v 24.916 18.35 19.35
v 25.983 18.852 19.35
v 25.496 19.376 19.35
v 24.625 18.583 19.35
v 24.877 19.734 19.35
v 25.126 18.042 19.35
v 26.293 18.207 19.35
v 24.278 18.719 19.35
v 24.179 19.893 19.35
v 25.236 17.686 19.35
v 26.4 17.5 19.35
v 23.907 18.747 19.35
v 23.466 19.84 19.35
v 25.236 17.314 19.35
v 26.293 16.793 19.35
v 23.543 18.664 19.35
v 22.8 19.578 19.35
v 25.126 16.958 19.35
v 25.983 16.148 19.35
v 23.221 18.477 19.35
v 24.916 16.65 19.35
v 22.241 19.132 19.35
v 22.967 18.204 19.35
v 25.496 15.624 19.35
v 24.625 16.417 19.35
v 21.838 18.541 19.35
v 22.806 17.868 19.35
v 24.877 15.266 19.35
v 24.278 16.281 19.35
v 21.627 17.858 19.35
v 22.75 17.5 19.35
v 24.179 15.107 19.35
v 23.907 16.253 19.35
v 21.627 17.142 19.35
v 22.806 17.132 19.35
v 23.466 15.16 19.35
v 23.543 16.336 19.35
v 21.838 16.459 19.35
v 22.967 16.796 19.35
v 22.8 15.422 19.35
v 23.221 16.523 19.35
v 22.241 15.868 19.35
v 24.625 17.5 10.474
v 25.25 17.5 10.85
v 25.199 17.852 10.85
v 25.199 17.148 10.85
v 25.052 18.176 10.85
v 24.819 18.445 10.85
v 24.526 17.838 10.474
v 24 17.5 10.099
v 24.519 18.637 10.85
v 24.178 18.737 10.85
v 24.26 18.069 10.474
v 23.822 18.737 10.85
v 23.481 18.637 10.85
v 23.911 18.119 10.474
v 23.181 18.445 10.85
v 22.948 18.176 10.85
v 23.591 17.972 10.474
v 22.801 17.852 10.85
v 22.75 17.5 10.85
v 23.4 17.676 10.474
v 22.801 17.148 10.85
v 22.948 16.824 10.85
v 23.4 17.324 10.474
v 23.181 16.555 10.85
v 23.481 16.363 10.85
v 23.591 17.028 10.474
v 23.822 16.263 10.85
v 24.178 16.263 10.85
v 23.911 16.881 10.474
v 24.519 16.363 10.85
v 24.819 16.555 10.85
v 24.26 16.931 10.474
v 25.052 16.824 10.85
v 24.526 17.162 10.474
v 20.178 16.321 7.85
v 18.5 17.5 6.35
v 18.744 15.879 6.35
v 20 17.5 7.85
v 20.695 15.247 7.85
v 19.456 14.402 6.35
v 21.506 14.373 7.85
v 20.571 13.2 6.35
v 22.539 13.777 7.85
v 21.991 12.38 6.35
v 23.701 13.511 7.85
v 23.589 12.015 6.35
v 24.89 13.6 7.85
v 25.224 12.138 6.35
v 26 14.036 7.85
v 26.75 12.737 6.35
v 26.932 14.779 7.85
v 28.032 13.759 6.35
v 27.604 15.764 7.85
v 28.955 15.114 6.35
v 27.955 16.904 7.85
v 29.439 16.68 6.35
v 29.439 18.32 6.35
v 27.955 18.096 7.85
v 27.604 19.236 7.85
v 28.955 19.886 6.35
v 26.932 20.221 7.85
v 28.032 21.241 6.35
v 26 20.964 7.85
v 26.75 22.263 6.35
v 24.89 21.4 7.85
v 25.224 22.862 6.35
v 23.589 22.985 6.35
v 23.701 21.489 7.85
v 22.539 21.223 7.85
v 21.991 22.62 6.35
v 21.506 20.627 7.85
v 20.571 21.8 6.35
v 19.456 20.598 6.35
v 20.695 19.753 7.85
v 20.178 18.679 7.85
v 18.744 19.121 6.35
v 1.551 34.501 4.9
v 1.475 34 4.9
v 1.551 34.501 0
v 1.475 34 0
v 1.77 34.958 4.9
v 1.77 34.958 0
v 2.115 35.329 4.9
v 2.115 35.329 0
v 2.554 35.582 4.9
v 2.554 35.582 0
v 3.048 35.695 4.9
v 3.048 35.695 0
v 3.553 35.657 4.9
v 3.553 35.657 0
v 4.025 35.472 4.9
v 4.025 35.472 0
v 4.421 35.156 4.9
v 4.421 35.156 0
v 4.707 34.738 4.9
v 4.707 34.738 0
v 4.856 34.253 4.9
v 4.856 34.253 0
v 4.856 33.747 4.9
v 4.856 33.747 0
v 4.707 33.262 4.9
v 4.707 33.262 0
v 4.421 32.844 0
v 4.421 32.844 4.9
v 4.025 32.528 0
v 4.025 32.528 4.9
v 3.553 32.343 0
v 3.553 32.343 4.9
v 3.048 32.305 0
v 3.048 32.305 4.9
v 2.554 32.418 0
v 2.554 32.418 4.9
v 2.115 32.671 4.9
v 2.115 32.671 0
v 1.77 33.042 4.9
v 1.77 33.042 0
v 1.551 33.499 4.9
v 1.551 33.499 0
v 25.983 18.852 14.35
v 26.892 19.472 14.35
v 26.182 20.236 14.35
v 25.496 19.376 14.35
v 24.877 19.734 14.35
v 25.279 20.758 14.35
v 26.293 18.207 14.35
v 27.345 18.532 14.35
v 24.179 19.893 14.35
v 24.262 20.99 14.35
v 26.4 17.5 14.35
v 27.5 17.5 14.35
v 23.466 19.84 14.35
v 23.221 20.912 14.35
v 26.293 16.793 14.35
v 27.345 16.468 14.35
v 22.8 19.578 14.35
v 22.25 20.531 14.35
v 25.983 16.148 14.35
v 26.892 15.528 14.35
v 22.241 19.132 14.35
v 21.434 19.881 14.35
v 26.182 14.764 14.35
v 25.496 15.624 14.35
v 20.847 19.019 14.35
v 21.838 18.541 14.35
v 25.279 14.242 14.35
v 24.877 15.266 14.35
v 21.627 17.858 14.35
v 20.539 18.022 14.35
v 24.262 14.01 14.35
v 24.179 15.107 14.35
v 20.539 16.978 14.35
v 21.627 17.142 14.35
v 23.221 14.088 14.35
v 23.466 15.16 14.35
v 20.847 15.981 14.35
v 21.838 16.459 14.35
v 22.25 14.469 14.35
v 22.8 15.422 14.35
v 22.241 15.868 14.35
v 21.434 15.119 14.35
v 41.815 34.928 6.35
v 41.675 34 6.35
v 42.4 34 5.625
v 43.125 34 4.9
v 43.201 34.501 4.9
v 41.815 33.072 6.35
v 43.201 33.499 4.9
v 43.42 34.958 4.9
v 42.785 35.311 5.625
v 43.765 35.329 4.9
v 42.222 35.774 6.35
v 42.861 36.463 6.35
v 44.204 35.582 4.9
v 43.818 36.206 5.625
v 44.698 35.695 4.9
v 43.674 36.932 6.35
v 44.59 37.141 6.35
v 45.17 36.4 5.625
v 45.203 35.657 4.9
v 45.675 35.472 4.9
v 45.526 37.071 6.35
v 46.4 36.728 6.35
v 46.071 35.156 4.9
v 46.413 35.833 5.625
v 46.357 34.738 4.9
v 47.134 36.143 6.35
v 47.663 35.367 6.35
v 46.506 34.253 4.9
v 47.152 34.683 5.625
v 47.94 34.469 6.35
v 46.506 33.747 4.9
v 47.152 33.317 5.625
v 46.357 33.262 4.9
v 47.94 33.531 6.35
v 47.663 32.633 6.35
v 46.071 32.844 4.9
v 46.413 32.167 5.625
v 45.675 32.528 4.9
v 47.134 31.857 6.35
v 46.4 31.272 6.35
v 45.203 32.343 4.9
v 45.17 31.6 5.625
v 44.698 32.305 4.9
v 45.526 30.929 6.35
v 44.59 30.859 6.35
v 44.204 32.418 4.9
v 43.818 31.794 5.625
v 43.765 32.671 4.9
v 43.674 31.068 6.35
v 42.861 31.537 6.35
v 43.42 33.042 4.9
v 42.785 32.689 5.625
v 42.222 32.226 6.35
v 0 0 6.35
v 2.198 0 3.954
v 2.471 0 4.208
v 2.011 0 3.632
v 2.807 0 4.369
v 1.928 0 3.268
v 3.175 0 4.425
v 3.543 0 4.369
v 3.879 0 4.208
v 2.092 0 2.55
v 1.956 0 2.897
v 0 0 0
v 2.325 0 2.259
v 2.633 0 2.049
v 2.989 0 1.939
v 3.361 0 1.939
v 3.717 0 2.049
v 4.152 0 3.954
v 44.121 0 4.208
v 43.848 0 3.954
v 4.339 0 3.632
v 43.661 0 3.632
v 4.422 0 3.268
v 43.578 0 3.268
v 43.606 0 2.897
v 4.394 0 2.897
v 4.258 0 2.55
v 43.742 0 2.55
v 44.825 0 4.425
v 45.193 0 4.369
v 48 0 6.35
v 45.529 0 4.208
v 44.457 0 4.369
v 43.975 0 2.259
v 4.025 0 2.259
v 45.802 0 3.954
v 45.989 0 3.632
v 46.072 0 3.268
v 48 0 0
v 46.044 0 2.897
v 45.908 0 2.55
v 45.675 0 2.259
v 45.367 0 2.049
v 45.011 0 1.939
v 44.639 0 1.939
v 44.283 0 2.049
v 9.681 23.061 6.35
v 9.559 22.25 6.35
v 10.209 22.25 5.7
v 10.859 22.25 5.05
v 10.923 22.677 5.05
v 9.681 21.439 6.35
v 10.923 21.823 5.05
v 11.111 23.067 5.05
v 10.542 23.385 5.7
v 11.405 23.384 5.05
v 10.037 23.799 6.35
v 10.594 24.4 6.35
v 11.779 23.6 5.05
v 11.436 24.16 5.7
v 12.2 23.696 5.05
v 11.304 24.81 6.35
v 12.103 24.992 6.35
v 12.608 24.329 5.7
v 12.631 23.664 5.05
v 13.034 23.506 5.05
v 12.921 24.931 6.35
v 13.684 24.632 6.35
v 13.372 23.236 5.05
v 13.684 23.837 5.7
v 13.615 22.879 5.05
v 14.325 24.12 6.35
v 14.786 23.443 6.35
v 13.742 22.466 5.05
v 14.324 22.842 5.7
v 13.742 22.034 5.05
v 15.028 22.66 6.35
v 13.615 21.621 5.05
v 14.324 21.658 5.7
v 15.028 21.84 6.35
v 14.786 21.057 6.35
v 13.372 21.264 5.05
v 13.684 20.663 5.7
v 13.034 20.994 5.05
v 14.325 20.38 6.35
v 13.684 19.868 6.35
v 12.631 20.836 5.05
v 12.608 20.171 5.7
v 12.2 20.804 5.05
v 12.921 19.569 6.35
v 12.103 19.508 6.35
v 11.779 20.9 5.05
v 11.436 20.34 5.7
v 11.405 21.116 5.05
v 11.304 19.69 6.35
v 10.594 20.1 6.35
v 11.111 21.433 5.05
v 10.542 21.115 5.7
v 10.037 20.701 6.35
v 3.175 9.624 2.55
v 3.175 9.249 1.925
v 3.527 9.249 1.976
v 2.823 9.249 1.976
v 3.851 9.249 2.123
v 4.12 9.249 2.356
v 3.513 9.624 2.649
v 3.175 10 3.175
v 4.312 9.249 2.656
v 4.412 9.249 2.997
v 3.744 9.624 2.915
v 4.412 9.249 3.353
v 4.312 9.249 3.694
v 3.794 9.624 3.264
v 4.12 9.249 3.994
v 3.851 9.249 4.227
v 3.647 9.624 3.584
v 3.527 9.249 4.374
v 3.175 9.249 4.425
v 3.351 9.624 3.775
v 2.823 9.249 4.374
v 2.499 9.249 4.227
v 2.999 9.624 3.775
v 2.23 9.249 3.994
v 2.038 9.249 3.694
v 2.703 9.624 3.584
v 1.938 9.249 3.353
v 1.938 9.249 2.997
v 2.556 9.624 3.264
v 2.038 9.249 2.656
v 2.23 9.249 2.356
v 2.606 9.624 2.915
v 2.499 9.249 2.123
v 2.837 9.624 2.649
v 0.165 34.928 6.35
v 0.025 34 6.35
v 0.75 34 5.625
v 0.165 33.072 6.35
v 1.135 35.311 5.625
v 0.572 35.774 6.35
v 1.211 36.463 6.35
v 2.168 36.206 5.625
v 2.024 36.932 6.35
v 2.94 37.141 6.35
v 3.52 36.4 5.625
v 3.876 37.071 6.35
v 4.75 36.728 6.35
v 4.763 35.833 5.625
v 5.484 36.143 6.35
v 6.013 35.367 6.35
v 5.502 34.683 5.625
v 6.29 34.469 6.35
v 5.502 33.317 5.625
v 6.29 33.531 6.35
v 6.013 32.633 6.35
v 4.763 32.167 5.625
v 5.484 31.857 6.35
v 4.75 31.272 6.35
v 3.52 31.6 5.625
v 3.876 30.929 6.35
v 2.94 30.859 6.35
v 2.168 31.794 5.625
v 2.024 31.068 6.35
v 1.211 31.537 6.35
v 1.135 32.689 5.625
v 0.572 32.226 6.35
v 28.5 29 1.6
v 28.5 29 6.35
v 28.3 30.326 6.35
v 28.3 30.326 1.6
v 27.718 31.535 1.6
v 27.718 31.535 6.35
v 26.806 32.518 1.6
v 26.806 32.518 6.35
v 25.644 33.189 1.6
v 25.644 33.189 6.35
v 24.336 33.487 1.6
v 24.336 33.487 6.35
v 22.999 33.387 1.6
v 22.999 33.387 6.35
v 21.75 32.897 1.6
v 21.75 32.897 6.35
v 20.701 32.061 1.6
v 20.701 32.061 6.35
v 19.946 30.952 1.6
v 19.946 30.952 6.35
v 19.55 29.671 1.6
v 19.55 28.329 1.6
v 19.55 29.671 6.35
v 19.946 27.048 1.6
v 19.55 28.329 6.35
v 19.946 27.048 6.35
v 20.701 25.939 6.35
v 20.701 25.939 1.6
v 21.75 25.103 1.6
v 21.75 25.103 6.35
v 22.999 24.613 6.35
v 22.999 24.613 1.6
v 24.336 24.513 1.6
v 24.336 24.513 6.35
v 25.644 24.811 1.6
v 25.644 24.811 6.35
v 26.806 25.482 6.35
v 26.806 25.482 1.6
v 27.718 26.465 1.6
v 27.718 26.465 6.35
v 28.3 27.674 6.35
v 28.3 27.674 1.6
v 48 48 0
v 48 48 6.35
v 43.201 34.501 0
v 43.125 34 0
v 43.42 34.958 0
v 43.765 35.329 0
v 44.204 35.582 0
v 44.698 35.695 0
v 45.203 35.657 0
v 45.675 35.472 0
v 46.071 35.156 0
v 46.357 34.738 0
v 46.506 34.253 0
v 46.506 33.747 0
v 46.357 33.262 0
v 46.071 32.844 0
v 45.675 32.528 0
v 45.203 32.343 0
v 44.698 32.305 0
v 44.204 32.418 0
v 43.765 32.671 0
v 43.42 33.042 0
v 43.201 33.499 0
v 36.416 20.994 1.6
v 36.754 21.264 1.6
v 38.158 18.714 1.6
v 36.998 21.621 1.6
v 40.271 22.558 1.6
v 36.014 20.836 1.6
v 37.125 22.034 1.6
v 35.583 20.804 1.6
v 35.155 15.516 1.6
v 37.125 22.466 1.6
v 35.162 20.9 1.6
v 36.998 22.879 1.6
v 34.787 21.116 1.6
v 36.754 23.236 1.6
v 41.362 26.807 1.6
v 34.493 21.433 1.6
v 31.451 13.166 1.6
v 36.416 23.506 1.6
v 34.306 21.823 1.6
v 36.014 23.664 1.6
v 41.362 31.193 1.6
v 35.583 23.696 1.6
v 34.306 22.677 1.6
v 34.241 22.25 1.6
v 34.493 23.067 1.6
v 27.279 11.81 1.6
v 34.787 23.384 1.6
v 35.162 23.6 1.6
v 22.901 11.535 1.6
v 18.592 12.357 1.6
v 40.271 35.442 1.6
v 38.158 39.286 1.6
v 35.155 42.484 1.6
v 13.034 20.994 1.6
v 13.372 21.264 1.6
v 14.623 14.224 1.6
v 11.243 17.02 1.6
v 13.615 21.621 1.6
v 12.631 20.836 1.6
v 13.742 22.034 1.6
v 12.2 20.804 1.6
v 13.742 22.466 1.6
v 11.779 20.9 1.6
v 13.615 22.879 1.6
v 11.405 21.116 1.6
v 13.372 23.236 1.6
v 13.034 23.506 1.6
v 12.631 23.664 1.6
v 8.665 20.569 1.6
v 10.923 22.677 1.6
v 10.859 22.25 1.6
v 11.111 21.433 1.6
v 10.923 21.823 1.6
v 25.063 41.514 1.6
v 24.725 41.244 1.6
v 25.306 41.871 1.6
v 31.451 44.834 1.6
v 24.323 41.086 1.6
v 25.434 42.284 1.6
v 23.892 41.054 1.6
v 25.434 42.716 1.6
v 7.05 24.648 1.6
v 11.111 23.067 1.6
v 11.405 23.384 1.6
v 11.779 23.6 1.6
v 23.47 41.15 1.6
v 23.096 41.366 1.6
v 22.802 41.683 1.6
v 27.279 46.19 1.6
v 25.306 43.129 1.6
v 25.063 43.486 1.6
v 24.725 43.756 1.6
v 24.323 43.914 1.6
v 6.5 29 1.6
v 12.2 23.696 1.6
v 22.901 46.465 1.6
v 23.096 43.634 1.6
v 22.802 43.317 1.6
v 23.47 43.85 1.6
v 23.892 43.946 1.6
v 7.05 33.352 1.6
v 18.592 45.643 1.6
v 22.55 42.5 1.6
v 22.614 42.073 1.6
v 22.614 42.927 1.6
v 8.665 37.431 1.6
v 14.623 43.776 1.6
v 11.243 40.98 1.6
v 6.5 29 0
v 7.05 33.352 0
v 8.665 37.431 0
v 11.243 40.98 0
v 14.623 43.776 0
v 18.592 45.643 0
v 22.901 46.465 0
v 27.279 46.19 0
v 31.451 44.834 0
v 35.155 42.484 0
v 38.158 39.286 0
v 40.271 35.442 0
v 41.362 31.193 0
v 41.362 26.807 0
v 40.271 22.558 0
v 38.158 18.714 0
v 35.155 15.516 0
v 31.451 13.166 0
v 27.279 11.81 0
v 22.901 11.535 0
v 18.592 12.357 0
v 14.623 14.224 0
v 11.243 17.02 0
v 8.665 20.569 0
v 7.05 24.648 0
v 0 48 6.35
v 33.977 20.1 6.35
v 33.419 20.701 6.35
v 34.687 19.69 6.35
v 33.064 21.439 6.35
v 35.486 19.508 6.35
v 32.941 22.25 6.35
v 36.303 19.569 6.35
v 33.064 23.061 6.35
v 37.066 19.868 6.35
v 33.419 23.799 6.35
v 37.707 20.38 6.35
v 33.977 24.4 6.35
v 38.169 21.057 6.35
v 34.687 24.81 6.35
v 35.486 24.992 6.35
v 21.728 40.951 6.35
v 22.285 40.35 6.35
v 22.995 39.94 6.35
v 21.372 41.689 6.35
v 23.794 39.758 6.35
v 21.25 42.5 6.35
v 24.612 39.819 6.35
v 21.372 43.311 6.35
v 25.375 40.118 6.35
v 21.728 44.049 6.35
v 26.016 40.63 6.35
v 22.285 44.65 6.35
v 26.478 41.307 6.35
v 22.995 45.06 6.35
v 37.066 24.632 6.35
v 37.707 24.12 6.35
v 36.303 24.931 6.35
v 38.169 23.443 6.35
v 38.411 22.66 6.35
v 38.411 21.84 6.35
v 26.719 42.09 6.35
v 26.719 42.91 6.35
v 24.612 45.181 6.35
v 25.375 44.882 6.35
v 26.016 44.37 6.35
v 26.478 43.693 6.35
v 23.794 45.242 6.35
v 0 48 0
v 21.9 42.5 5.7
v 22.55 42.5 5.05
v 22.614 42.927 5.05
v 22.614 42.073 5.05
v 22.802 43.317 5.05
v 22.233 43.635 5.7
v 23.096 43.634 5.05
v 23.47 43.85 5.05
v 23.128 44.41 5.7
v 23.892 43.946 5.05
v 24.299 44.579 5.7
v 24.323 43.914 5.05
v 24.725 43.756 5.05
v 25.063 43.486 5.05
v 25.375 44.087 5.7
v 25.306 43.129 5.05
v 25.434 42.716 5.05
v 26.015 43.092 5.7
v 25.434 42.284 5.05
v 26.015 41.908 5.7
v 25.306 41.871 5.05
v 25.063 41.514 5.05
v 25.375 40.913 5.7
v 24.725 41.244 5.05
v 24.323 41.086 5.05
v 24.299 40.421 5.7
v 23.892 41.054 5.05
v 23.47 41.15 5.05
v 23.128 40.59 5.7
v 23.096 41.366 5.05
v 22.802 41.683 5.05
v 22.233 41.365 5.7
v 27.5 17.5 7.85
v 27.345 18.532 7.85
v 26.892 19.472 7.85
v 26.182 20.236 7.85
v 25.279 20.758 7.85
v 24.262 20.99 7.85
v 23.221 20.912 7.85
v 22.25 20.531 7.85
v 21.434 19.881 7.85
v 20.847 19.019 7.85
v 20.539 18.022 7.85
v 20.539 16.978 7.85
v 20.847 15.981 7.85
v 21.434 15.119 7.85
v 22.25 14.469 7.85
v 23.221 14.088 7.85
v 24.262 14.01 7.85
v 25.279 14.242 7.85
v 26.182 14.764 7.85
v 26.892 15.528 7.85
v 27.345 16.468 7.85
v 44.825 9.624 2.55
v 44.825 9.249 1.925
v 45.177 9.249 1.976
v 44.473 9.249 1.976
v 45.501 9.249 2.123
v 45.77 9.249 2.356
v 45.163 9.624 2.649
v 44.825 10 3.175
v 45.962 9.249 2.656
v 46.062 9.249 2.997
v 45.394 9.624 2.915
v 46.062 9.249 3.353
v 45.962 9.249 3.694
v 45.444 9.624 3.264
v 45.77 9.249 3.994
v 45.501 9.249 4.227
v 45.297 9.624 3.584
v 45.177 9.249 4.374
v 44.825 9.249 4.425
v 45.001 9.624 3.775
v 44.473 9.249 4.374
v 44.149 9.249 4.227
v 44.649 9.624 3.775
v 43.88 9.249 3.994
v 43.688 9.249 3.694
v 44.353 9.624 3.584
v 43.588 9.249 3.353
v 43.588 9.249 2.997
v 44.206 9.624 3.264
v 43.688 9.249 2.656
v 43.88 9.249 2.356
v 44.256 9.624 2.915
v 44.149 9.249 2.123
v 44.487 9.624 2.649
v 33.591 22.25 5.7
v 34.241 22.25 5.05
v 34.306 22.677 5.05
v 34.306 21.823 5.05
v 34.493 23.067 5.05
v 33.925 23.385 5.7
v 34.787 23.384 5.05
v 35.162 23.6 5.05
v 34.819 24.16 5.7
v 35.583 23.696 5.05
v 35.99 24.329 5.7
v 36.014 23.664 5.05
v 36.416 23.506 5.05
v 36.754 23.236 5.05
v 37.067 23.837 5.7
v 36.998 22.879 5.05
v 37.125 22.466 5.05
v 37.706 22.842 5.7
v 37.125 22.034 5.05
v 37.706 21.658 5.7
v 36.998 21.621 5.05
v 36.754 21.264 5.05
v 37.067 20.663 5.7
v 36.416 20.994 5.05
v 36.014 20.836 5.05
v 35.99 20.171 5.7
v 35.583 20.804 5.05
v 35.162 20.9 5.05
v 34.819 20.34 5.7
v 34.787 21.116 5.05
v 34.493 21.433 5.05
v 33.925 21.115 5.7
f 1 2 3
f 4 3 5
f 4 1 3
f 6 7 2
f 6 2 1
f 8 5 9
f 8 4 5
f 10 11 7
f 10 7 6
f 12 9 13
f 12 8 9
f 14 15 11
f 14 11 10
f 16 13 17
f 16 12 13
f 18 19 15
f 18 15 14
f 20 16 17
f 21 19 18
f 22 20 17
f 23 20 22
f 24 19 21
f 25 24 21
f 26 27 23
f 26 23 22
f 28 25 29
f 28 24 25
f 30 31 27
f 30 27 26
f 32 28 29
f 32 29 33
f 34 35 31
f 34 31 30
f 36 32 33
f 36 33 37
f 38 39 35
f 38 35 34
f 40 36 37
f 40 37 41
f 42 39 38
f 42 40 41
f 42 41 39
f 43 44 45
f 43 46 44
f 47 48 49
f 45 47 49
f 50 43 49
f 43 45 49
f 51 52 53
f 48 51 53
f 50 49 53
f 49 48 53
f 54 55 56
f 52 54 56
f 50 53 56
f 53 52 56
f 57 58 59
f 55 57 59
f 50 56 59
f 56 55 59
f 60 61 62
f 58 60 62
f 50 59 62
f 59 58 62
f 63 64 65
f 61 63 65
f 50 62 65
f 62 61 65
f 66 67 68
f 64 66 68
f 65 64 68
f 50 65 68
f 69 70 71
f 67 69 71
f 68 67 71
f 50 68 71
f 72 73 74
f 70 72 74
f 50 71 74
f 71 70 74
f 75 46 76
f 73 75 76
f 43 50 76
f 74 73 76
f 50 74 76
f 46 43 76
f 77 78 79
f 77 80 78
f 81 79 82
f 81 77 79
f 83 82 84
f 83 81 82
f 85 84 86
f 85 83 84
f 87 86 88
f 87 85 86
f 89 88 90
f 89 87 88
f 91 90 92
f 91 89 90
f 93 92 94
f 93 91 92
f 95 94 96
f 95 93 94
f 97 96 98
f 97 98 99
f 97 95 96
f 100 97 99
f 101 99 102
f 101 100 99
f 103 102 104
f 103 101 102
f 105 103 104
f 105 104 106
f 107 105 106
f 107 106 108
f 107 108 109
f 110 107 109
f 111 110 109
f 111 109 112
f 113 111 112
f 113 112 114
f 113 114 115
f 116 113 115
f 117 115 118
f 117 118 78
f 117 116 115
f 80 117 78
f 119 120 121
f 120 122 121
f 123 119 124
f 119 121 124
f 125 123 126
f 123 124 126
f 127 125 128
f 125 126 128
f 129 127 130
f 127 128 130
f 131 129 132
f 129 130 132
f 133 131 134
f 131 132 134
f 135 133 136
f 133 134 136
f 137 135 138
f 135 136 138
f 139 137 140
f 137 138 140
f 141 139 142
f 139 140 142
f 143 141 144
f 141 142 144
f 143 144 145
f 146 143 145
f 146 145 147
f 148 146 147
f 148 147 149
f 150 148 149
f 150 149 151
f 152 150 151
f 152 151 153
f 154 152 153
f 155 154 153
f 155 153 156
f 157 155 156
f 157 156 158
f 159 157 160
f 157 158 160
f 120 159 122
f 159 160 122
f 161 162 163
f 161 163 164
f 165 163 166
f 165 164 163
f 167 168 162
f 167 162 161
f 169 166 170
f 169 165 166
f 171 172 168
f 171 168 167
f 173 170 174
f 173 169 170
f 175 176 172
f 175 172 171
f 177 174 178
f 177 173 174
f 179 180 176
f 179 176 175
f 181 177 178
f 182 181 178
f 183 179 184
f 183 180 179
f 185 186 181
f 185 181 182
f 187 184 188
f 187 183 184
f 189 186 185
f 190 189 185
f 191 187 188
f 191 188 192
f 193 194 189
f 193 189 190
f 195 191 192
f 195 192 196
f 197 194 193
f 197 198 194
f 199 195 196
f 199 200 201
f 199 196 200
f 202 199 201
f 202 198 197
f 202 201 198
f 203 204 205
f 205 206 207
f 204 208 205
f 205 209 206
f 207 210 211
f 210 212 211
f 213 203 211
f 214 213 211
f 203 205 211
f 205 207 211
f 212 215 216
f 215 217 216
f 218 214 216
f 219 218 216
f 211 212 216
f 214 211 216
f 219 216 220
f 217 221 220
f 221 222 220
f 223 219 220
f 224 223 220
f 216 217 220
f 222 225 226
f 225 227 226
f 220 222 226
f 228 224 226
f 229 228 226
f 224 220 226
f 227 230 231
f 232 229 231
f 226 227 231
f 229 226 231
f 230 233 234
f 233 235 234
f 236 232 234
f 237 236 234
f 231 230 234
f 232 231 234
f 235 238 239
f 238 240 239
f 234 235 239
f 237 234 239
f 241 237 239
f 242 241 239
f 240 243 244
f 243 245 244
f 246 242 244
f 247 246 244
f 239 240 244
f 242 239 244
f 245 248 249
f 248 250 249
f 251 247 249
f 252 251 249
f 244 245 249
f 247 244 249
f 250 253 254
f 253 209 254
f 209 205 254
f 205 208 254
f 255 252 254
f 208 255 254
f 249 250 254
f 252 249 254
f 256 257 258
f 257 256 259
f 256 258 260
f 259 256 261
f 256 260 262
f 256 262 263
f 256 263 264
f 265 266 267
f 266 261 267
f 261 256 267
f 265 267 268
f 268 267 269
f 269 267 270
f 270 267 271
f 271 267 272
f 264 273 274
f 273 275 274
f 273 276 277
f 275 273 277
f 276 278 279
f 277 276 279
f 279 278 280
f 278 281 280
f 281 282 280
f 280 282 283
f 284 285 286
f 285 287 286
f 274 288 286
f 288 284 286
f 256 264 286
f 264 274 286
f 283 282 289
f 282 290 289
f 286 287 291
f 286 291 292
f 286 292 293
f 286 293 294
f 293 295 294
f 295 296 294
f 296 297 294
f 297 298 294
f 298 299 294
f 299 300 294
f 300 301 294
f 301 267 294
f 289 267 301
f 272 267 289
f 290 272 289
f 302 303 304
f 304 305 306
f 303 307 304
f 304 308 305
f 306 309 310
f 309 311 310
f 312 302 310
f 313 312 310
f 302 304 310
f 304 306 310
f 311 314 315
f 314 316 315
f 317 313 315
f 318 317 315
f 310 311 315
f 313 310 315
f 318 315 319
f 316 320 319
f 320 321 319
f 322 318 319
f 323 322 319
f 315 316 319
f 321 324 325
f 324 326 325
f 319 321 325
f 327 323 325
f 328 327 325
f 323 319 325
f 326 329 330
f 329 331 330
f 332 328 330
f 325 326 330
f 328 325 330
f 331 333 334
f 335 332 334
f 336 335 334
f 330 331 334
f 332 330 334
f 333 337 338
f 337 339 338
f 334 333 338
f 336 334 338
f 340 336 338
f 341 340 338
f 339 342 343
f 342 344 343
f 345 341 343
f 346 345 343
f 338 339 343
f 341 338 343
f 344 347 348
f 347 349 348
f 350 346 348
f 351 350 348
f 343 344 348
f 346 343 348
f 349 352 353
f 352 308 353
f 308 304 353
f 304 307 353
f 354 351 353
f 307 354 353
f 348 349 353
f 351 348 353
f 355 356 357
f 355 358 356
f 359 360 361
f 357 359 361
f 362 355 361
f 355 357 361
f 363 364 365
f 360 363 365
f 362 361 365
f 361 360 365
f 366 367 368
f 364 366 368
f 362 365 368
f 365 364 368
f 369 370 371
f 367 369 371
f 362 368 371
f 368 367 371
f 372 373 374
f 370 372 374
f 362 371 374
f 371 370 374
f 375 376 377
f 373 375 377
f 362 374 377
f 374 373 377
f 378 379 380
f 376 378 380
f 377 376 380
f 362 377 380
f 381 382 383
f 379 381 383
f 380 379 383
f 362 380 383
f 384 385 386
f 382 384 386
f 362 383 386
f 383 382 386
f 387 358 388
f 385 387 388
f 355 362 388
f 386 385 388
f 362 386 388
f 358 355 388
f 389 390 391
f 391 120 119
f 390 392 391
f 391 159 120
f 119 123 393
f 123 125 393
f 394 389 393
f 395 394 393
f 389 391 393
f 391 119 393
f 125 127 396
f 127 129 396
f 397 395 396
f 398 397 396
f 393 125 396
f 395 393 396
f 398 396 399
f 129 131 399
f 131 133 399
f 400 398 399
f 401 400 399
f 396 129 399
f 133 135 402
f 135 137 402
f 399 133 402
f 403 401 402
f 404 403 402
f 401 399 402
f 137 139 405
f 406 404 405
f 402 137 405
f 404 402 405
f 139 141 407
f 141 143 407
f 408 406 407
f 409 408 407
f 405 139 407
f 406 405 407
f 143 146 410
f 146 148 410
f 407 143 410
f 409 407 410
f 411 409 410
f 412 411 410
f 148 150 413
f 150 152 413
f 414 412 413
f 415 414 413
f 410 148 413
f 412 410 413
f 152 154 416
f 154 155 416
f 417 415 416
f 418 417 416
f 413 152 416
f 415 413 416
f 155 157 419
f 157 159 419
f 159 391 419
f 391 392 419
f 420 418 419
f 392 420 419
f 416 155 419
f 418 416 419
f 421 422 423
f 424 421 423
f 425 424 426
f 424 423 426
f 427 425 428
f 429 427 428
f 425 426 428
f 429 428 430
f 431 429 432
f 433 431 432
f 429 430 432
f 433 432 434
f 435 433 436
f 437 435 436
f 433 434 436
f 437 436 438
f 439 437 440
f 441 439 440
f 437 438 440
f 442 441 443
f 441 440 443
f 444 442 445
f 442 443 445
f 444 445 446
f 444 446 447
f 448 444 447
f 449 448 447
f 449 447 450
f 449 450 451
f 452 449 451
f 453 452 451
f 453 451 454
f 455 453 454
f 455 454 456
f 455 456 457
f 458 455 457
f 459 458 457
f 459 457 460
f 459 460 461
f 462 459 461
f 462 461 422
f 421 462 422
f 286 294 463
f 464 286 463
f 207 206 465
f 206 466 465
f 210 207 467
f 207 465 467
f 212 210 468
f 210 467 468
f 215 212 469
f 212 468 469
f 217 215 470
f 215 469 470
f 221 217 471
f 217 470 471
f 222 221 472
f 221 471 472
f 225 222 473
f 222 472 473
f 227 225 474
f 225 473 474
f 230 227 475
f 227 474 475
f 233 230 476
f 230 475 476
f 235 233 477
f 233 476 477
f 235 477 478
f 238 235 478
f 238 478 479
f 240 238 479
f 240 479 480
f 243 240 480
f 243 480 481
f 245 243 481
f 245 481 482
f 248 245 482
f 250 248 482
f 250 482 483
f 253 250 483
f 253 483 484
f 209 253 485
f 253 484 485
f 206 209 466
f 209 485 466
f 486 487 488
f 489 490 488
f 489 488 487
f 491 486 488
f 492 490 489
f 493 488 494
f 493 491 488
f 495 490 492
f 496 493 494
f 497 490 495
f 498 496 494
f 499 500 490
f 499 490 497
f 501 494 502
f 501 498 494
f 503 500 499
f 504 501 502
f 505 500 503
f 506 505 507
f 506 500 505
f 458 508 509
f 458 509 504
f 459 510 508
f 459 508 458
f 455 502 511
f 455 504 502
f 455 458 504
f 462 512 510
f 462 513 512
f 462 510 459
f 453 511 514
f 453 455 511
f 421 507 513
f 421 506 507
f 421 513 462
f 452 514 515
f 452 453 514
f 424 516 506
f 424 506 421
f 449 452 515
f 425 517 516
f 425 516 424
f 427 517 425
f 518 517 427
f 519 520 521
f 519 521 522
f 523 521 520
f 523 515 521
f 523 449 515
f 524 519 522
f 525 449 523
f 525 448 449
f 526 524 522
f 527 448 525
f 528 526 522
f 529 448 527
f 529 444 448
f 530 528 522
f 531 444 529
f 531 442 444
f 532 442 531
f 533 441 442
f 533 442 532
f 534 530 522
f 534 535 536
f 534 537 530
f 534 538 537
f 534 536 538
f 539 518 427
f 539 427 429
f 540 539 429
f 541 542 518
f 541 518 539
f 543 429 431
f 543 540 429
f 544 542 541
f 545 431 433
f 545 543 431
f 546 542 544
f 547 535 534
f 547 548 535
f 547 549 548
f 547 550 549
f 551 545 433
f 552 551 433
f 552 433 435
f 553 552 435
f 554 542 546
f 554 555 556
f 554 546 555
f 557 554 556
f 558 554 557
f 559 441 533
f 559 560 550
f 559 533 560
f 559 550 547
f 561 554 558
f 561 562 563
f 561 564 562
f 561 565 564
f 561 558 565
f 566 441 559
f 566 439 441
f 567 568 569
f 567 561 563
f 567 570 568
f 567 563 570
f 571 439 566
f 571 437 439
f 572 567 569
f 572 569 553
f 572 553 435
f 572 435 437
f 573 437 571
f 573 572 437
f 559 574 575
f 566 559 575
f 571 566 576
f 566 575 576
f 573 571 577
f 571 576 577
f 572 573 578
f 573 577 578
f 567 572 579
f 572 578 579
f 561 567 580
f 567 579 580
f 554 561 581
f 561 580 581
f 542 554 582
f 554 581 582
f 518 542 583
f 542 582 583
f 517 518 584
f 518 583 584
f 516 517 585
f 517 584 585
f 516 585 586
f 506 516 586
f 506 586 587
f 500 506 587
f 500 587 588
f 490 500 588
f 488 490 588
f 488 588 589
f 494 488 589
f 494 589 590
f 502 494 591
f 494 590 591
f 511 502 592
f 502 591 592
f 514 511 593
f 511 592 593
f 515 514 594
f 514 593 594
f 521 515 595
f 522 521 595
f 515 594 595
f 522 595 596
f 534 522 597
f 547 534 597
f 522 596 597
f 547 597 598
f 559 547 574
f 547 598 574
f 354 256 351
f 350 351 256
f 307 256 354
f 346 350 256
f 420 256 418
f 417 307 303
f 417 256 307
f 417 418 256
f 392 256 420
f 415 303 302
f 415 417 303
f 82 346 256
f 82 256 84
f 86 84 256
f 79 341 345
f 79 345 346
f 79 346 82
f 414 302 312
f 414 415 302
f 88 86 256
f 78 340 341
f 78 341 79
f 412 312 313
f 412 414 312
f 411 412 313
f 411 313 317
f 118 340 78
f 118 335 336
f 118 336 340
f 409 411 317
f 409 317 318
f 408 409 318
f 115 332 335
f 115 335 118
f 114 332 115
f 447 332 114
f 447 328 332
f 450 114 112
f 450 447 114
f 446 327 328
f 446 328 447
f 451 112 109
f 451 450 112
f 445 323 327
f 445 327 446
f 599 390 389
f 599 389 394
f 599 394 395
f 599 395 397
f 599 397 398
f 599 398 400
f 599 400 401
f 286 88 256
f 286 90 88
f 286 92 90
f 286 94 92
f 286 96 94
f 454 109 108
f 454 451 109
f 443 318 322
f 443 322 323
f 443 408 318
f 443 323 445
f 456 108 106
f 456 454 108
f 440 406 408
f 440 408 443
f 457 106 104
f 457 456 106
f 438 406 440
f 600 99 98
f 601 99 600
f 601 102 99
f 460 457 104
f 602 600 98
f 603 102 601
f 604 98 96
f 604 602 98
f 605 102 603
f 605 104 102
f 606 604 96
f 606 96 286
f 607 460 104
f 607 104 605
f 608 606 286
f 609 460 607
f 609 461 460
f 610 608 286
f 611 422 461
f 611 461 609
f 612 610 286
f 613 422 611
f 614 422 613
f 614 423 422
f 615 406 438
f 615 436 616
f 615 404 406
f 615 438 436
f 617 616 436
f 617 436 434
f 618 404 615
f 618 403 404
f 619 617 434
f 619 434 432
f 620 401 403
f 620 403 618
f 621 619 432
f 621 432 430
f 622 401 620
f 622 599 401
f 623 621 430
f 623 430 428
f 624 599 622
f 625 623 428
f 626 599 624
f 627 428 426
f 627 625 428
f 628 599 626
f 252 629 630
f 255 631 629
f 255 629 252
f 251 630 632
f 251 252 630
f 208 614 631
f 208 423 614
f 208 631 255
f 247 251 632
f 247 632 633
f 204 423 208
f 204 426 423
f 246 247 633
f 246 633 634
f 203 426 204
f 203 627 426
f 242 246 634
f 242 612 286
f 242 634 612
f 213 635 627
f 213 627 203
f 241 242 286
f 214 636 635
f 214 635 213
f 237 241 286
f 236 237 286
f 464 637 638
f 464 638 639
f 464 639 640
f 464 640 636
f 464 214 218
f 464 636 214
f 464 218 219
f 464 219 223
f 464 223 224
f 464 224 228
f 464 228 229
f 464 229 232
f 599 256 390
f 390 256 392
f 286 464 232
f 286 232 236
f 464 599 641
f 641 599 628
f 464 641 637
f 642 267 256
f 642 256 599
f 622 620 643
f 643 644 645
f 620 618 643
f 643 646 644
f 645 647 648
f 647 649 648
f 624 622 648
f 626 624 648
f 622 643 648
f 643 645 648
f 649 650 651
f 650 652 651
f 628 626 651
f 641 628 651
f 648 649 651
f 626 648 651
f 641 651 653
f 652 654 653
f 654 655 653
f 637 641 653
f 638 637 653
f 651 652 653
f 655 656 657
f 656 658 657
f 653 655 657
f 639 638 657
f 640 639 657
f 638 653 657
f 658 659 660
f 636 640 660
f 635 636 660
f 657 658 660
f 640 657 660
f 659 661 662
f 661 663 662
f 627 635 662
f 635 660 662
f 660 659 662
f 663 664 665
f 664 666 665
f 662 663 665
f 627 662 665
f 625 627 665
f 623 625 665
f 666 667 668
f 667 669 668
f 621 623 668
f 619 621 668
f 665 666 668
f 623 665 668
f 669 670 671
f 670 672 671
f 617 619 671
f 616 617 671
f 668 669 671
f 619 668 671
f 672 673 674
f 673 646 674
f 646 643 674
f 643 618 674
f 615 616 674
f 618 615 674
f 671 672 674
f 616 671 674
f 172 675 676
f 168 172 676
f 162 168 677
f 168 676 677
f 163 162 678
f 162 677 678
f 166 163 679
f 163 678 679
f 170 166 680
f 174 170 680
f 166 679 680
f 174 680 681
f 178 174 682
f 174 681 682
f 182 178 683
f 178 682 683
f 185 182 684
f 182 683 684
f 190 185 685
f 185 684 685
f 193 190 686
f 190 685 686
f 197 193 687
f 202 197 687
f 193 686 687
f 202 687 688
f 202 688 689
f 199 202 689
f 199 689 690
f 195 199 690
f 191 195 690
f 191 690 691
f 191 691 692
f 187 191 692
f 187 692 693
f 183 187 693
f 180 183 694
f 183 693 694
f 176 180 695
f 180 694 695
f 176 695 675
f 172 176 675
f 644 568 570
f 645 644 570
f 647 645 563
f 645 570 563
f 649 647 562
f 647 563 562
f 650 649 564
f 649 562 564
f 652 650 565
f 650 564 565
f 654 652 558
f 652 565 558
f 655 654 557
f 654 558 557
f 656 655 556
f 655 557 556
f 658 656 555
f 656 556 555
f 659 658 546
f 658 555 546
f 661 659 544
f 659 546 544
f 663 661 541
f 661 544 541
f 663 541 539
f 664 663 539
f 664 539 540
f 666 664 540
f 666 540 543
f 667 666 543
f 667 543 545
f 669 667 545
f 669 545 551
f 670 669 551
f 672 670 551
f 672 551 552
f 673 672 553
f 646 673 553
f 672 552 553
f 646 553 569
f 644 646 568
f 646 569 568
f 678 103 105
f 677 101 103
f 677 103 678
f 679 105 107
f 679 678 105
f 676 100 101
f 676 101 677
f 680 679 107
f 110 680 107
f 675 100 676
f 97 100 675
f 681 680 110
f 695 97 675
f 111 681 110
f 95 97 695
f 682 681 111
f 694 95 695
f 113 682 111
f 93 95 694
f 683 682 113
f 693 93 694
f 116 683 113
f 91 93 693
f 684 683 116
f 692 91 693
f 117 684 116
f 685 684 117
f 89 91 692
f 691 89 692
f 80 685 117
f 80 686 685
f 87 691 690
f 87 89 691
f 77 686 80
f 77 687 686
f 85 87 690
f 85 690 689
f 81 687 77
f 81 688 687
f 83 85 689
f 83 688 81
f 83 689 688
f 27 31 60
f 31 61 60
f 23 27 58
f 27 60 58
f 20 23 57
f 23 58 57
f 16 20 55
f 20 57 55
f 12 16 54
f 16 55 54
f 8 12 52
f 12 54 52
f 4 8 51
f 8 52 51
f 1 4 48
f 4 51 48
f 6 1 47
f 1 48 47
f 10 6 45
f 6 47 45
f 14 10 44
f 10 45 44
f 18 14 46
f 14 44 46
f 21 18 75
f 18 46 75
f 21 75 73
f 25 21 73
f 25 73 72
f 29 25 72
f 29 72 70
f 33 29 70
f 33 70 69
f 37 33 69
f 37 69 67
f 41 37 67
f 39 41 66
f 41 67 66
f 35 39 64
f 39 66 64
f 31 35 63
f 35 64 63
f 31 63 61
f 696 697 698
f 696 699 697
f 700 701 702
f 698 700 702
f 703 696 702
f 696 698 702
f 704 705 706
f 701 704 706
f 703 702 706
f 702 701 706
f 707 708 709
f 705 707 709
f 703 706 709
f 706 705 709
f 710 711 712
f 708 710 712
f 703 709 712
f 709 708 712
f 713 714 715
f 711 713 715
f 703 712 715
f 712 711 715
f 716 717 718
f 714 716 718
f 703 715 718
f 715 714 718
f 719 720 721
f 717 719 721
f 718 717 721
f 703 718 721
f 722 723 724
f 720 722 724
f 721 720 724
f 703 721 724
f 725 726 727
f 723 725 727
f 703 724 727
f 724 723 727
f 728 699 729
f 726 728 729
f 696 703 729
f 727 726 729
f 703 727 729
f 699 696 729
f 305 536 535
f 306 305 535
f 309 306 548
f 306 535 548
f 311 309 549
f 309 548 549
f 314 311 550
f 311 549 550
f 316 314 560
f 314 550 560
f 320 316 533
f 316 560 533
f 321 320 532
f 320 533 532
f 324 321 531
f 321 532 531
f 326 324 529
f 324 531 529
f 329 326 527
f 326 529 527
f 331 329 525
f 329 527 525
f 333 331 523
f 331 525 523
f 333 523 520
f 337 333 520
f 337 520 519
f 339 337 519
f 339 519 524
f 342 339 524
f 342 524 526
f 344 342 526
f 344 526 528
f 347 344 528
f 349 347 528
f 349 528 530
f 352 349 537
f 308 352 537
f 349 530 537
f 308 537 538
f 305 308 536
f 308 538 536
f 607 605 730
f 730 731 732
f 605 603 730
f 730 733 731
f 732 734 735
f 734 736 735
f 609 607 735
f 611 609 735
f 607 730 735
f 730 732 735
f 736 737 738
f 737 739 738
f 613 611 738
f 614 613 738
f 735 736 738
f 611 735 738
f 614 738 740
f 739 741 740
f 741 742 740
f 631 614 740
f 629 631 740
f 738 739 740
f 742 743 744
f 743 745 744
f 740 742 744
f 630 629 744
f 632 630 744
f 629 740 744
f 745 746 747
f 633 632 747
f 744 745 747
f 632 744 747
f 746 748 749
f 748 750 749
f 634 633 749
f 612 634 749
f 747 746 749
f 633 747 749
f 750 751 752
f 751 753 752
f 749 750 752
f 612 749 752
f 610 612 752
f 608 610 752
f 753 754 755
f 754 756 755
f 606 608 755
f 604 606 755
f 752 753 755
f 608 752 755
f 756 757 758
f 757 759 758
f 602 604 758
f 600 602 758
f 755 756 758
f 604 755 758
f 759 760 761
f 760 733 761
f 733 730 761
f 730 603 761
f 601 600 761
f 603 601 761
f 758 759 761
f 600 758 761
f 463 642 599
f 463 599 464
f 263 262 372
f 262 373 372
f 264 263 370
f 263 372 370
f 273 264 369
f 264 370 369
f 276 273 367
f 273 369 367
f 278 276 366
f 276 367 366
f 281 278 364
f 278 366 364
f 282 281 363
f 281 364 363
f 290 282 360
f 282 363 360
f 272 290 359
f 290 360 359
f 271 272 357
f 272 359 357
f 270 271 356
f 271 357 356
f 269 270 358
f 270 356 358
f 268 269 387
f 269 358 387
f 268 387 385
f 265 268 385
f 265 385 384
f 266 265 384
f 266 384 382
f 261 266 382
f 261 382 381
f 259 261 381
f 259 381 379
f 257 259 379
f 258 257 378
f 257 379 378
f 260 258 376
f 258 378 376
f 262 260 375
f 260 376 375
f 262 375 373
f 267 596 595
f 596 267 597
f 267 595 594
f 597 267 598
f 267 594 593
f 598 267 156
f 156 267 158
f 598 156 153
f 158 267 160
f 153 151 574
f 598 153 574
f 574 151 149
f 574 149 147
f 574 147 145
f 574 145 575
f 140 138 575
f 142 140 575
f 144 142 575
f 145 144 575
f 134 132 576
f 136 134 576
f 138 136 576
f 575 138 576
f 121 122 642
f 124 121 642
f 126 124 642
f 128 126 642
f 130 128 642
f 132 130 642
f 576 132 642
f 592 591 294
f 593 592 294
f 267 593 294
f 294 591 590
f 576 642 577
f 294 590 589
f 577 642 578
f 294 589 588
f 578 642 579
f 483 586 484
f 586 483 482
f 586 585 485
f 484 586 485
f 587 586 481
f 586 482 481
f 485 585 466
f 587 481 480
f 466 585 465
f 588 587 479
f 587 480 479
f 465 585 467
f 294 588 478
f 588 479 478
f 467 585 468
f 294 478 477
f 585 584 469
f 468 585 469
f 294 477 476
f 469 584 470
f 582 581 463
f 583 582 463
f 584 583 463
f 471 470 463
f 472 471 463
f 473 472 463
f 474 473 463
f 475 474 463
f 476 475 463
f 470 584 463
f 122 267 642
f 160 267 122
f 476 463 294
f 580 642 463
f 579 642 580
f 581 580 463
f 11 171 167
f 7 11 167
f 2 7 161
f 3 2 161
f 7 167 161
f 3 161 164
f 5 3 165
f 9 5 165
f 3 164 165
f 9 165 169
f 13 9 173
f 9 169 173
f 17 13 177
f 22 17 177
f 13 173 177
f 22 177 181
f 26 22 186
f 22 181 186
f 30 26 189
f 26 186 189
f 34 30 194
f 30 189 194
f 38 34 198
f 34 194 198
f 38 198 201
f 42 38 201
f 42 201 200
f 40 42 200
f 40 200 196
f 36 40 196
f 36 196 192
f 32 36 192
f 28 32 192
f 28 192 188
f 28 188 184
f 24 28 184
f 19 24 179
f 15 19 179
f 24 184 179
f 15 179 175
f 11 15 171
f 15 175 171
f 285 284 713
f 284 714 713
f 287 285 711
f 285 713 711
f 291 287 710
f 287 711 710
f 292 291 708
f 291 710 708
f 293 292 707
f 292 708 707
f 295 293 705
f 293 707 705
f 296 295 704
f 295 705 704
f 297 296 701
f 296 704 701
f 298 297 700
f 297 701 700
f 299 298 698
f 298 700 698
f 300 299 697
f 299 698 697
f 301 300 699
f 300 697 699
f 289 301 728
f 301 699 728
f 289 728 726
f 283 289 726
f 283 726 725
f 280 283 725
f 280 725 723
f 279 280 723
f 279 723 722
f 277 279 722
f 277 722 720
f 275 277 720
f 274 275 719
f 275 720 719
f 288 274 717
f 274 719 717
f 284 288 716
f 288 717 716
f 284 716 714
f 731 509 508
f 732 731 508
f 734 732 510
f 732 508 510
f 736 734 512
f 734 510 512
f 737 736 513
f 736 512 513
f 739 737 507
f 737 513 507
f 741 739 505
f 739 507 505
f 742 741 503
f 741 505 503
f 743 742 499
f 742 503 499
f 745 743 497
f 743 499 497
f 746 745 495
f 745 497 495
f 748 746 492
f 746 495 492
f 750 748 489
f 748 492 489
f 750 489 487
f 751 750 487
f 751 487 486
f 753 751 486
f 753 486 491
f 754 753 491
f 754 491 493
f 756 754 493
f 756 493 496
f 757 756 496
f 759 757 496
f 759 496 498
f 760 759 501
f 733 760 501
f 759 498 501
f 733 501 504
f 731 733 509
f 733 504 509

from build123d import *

# Parameters (mm, degrees)
ESBO_O1_W                                            = 48
ESBO_O1_H                                            = 48
RESSALTO_EXTRUS_O1_DEPTH                             = 6.35
ESBO_O3_R                                            = 6
RESSALTO_EXTRUS_O2_DEPTH                             = 13
CORTE_EXTRUS_O1_START                                = -5
ESBO_O4_R                                            = 6
ESBO_O4_R_2                                          = 2.4
CORTE_EXTRUS_O1_DEPTH                                = 5
CORTE_EXTRUS_O2_START                                = -6.5
ESBO_O5_R                                            = 6
ESBO_O5_R_2                                          = 3.5
CORTE_EXTRUS_O2_DEPTH                                = 6.5
FURO_ROSCADO_DE_M31_D                                = 2.5
FURO_ROSCADO_DE_M31_DEPTH                            = 8.5
FURO_ROSCADO_DE_M31_TIP                              = 0.751075774
ESCAREADO_PARA_PARAFUSO_COM_CABE_A_ESCAR_D           = 3.4
ESCAREADO_PARA_PARAFUSO_COM_CABE_A_ESCAR_DEPTH       = 10.778536948
ESCAREADO_PARA_PARAFUSO_COM_CABE_A_ESCAR_CSINK_D     = 6.3
ESCAREADO_PARA_PARAFUSO_COM_CABE_A_ESCAR_CSINK_ANGLE = 90
ESCAREADO_PARA_PARAFUSO_COM_CABE_A_ESCAR_TIP         = 1.021463052
FURO_ROSCADO_DE_M32_D                                = 2.5
FURO_ROSCADO_DE_M32_DEPTH                            = 9.248924226
FURO_ROSCADO_DE_M32_TIP                              = 0.751075774
CHANFRO4_SIZE                                        = 2
ESBO_O29_R                                           = 4.5
CORTE_EXTRUS_O3_DEPTH                                = 70.115844783
ESCAREADO_PARA_PARAFUSO_COM_CABE_A_E_2_D             = 2.9
ESCAREADO_PARA_PARAFUSO_COM_CABE_A_E_2_CSINK_D       = 5.5
ESCAREADO_PARA_PARAFUSO_COM_CABE_A_E_2_CSINK_ANGLE   = 90
ESBO_O32_R                                           = 17.5
CORTE_EXTRUS_O4_DEPTH                                = 1.6


with BuildPart() as part:
    # Esboço1 → Ressalto-extrusão1 (new body)
    with BuildSketch(Plane.XY):
        with Locations((24, 24)):
            Rectangle(ESBO_O1_W, ESBO_O1_H)
    extrude(amount=RESSALTO_EXTRUS_O1_DEPTH)

    # Esboço3 → Ressalto-extrusão2 (add)
    with BuildSketch(Plane.XY.offset(6.35)):
        with Locations(Location((24, 17.5, 0), (0, 0, 180))):
            Circle(ESBO_O3_R)
    extrude(amount=RESSALTO_EXTRUS_O2_DEPTH)

    # Esboço4 → Corte-extrusão1 (cut)
    with BuildSketch(Plane.XY.offset(19.35).offset(CORTE_EXTRUS_O1_START)):
        with Locations(Location((24, 17.5, 0), (0, 0, 180))):
            Circle(ESBO_O4_R)
        with Locations((24, 17.5)):
            Circle(ESBO_O4_R_2, mode=Mode.SUBTRACT)
    extrude(amount=CORTE_EXTRUS_O1_DEPTH, mode=Mode.SUBTRACT)

    # Esboço5 → Corte-extrusão2 (cut)
    with BuildSketch(Plane.XY.offset(14.35).offset(CORTE_EXTRUS_O2_START)):
        with Locations(Location((24, 17.5, 0), (0, 0, 180))):
            Circle(ESBO_O5_R)
        with Locations((24, 17.5)):
            Circle(ESBO_O5_R_2, mode=Mode.SUBTRACT)
    extrude(amount=CORTE_EXTRUS_O2_DEPTH, mode=Mode.SUBTRACT)

    # Furo roscado de M31
    with Locations(Plane(origin=(24, 17.5, 19.35), x_dir=(1, 0, 0), z_dir=(0, 0, 1))):
        with Locations((0, 0)):
            Hole(FURO_ROSCADO_DE_M31_D / 2, depth=FURO_ROSCADO_DE_M31_DEPTH)
            with Locations((0, 0, -(FURO_ROSCADO_DE_M31_DEPTH + FURO_ROSCADO_DE_M31_TIP / 2))):  # 118° drill point
                Cone(0, FURO_ROSCADO_DE_M31_D / 2, FURO_ROSCADO_DE_M31_TIP, mode=Mode.SUBTRACT)

    # Escareado para parafuso com cabe_a escar
    with Locations(Plane(origin=(44.825, 34, 6.35), x_dir=(1, 0, 0), z_dir=(0, 0, 1))):
        with Locations((0, 0), (-41.65, 0)):
            CounterSinkHole(ESCAREADO_PARA_PARAFUSO_COM_CABE_A_ESCAR_D / 2, ESCAREADO_PARA_PARAFUSO_COM_CABE_A_ESCAR_CSINK_D / 2, depth=ESCAREADO_PARA_PARAFUSO_COM_CABE_A_ESCAR_DEPTH, counter_sink_angle=ESCAREADO_PARA_PARAFUSO_COM_CABE_A_ESCAR_CSINK_ANGLE)
            with Locations((0, 0, -(ESCAREADO_PARA_PARAFUSO_COM_CABE_A_ESCAR_DEPTH + ESCAREADO_PARA_PARAFUSO_COM_CABE_A_ESCAR_TIP / 2))):  # 118° drill point
                Cone(0, ESCAREADO_PARA_PARAFUSO_COM_CABE_A_ESCAR_D / 2, ESCAREADO_PARA_PARAFUSO_COM_CABE_A_ESCAR_TIP, mode=Mode.SUBTRACT)

    # Furo roscado de M32
    with Locations(Plane(origin=(3.175, 0, 3.175), x_dir=(0, 0, -1), z_dir=(0, -1, 0))):
        with Locations((0, 0), (0, 41.65)):
            Hole(FURO_ROSCADO_DE_M32_D / 2, depth=FURO_ROSCADO_DE_M32_DEPTH)
            with Locations((0, 0, -(FURO_ROSCADO_DE_M32_DEPTH + FURO_ROSCADO_DE_M32_TIP / 2))):  # 118° drill point
                Cone(0, FURO_ROSCADO_DE_M32_D / 2, FURO_ROSCADO_DE_M32_TIP, mode=Mode.SUBTRACT)

    # Chanfro4
    # the kernel refuses this chamfer: 2 mm, written as the material it takes off along each edge
    with BuildSketch(Plane(origin=(24, 17.5, 7.85), x_dir=(-1, 0, 0), z_dir=(0, 1, 0))) as chanfro4_piece_1_section:
        Polygon((6, -CHANFRO4_SIZE), (6 - CHANFRO4_SIZE, 0), (6, 0), align=None)
    chanfro4_piece_1 = revolve(axis=Axis((24, 17.5, 7.85), (0, 0, 1)), mode=Mode.PRIVATE)
    chanfro4_piece_1 = split(chanfro4_piece_1, bisect_by=Plane(origin=(28.750537315, 17.5, 6.35), z_dir=(0, 0, 1)), keep=Keep.TOP, mode=Mode.PRIVATE)
    add(chanfro4_piece_1, mode=Mode.SUBTRACT)

    # Esboço29 → Corte-extrusão3 (cut, through all)
    with BuildSketch(Plane.XY.offset(6.35)):
        with Locations((24, 29)):
            Circle(ESBO_O29_R)
    extrude(amount=-CORTE_EXTRUS_O3_DEPTH, mode=Mode.SUBTRACT)

    # Escareado para parafuso com cabe_a e 2 (through all)
    with Locations(Plane(origin=(12.308657049, 22.25, 6.35), x_dir=(1, 0, 0), z_dir=(0, 0, 1))):
        with Locations((0, 0), (23.382685902, 0), (11.691342951, 20.25)):
            CounterSinkHole(ESCAREADO_PARA_PARAFUSO_COM_CABE_A_E_2_D / 2, ESCAREADO_PARA_PARAFUSO_COM_CABE_A_E_2_CSINK_D / 2, counter_sink_angle=ESCAREADO_PARA_PARAFUSO_COM_CABE_A_E_2_CSINK_ANGLE)

    # Esboço32 → Corte-extrusão4 (cut)
    with BuildSketch(Plane(origin=(0, 0, 0), x_dir=(-1, 0, 0), z_dir=(0, 0, -1))):
        with Locations((-24, 29)):
            Circle(ESBO_O32_R)
    extrude(amount=-CORTE_EXTRUS_O4_DEPTH, mode=Mode.SUBTRACT)


solid = part.part
